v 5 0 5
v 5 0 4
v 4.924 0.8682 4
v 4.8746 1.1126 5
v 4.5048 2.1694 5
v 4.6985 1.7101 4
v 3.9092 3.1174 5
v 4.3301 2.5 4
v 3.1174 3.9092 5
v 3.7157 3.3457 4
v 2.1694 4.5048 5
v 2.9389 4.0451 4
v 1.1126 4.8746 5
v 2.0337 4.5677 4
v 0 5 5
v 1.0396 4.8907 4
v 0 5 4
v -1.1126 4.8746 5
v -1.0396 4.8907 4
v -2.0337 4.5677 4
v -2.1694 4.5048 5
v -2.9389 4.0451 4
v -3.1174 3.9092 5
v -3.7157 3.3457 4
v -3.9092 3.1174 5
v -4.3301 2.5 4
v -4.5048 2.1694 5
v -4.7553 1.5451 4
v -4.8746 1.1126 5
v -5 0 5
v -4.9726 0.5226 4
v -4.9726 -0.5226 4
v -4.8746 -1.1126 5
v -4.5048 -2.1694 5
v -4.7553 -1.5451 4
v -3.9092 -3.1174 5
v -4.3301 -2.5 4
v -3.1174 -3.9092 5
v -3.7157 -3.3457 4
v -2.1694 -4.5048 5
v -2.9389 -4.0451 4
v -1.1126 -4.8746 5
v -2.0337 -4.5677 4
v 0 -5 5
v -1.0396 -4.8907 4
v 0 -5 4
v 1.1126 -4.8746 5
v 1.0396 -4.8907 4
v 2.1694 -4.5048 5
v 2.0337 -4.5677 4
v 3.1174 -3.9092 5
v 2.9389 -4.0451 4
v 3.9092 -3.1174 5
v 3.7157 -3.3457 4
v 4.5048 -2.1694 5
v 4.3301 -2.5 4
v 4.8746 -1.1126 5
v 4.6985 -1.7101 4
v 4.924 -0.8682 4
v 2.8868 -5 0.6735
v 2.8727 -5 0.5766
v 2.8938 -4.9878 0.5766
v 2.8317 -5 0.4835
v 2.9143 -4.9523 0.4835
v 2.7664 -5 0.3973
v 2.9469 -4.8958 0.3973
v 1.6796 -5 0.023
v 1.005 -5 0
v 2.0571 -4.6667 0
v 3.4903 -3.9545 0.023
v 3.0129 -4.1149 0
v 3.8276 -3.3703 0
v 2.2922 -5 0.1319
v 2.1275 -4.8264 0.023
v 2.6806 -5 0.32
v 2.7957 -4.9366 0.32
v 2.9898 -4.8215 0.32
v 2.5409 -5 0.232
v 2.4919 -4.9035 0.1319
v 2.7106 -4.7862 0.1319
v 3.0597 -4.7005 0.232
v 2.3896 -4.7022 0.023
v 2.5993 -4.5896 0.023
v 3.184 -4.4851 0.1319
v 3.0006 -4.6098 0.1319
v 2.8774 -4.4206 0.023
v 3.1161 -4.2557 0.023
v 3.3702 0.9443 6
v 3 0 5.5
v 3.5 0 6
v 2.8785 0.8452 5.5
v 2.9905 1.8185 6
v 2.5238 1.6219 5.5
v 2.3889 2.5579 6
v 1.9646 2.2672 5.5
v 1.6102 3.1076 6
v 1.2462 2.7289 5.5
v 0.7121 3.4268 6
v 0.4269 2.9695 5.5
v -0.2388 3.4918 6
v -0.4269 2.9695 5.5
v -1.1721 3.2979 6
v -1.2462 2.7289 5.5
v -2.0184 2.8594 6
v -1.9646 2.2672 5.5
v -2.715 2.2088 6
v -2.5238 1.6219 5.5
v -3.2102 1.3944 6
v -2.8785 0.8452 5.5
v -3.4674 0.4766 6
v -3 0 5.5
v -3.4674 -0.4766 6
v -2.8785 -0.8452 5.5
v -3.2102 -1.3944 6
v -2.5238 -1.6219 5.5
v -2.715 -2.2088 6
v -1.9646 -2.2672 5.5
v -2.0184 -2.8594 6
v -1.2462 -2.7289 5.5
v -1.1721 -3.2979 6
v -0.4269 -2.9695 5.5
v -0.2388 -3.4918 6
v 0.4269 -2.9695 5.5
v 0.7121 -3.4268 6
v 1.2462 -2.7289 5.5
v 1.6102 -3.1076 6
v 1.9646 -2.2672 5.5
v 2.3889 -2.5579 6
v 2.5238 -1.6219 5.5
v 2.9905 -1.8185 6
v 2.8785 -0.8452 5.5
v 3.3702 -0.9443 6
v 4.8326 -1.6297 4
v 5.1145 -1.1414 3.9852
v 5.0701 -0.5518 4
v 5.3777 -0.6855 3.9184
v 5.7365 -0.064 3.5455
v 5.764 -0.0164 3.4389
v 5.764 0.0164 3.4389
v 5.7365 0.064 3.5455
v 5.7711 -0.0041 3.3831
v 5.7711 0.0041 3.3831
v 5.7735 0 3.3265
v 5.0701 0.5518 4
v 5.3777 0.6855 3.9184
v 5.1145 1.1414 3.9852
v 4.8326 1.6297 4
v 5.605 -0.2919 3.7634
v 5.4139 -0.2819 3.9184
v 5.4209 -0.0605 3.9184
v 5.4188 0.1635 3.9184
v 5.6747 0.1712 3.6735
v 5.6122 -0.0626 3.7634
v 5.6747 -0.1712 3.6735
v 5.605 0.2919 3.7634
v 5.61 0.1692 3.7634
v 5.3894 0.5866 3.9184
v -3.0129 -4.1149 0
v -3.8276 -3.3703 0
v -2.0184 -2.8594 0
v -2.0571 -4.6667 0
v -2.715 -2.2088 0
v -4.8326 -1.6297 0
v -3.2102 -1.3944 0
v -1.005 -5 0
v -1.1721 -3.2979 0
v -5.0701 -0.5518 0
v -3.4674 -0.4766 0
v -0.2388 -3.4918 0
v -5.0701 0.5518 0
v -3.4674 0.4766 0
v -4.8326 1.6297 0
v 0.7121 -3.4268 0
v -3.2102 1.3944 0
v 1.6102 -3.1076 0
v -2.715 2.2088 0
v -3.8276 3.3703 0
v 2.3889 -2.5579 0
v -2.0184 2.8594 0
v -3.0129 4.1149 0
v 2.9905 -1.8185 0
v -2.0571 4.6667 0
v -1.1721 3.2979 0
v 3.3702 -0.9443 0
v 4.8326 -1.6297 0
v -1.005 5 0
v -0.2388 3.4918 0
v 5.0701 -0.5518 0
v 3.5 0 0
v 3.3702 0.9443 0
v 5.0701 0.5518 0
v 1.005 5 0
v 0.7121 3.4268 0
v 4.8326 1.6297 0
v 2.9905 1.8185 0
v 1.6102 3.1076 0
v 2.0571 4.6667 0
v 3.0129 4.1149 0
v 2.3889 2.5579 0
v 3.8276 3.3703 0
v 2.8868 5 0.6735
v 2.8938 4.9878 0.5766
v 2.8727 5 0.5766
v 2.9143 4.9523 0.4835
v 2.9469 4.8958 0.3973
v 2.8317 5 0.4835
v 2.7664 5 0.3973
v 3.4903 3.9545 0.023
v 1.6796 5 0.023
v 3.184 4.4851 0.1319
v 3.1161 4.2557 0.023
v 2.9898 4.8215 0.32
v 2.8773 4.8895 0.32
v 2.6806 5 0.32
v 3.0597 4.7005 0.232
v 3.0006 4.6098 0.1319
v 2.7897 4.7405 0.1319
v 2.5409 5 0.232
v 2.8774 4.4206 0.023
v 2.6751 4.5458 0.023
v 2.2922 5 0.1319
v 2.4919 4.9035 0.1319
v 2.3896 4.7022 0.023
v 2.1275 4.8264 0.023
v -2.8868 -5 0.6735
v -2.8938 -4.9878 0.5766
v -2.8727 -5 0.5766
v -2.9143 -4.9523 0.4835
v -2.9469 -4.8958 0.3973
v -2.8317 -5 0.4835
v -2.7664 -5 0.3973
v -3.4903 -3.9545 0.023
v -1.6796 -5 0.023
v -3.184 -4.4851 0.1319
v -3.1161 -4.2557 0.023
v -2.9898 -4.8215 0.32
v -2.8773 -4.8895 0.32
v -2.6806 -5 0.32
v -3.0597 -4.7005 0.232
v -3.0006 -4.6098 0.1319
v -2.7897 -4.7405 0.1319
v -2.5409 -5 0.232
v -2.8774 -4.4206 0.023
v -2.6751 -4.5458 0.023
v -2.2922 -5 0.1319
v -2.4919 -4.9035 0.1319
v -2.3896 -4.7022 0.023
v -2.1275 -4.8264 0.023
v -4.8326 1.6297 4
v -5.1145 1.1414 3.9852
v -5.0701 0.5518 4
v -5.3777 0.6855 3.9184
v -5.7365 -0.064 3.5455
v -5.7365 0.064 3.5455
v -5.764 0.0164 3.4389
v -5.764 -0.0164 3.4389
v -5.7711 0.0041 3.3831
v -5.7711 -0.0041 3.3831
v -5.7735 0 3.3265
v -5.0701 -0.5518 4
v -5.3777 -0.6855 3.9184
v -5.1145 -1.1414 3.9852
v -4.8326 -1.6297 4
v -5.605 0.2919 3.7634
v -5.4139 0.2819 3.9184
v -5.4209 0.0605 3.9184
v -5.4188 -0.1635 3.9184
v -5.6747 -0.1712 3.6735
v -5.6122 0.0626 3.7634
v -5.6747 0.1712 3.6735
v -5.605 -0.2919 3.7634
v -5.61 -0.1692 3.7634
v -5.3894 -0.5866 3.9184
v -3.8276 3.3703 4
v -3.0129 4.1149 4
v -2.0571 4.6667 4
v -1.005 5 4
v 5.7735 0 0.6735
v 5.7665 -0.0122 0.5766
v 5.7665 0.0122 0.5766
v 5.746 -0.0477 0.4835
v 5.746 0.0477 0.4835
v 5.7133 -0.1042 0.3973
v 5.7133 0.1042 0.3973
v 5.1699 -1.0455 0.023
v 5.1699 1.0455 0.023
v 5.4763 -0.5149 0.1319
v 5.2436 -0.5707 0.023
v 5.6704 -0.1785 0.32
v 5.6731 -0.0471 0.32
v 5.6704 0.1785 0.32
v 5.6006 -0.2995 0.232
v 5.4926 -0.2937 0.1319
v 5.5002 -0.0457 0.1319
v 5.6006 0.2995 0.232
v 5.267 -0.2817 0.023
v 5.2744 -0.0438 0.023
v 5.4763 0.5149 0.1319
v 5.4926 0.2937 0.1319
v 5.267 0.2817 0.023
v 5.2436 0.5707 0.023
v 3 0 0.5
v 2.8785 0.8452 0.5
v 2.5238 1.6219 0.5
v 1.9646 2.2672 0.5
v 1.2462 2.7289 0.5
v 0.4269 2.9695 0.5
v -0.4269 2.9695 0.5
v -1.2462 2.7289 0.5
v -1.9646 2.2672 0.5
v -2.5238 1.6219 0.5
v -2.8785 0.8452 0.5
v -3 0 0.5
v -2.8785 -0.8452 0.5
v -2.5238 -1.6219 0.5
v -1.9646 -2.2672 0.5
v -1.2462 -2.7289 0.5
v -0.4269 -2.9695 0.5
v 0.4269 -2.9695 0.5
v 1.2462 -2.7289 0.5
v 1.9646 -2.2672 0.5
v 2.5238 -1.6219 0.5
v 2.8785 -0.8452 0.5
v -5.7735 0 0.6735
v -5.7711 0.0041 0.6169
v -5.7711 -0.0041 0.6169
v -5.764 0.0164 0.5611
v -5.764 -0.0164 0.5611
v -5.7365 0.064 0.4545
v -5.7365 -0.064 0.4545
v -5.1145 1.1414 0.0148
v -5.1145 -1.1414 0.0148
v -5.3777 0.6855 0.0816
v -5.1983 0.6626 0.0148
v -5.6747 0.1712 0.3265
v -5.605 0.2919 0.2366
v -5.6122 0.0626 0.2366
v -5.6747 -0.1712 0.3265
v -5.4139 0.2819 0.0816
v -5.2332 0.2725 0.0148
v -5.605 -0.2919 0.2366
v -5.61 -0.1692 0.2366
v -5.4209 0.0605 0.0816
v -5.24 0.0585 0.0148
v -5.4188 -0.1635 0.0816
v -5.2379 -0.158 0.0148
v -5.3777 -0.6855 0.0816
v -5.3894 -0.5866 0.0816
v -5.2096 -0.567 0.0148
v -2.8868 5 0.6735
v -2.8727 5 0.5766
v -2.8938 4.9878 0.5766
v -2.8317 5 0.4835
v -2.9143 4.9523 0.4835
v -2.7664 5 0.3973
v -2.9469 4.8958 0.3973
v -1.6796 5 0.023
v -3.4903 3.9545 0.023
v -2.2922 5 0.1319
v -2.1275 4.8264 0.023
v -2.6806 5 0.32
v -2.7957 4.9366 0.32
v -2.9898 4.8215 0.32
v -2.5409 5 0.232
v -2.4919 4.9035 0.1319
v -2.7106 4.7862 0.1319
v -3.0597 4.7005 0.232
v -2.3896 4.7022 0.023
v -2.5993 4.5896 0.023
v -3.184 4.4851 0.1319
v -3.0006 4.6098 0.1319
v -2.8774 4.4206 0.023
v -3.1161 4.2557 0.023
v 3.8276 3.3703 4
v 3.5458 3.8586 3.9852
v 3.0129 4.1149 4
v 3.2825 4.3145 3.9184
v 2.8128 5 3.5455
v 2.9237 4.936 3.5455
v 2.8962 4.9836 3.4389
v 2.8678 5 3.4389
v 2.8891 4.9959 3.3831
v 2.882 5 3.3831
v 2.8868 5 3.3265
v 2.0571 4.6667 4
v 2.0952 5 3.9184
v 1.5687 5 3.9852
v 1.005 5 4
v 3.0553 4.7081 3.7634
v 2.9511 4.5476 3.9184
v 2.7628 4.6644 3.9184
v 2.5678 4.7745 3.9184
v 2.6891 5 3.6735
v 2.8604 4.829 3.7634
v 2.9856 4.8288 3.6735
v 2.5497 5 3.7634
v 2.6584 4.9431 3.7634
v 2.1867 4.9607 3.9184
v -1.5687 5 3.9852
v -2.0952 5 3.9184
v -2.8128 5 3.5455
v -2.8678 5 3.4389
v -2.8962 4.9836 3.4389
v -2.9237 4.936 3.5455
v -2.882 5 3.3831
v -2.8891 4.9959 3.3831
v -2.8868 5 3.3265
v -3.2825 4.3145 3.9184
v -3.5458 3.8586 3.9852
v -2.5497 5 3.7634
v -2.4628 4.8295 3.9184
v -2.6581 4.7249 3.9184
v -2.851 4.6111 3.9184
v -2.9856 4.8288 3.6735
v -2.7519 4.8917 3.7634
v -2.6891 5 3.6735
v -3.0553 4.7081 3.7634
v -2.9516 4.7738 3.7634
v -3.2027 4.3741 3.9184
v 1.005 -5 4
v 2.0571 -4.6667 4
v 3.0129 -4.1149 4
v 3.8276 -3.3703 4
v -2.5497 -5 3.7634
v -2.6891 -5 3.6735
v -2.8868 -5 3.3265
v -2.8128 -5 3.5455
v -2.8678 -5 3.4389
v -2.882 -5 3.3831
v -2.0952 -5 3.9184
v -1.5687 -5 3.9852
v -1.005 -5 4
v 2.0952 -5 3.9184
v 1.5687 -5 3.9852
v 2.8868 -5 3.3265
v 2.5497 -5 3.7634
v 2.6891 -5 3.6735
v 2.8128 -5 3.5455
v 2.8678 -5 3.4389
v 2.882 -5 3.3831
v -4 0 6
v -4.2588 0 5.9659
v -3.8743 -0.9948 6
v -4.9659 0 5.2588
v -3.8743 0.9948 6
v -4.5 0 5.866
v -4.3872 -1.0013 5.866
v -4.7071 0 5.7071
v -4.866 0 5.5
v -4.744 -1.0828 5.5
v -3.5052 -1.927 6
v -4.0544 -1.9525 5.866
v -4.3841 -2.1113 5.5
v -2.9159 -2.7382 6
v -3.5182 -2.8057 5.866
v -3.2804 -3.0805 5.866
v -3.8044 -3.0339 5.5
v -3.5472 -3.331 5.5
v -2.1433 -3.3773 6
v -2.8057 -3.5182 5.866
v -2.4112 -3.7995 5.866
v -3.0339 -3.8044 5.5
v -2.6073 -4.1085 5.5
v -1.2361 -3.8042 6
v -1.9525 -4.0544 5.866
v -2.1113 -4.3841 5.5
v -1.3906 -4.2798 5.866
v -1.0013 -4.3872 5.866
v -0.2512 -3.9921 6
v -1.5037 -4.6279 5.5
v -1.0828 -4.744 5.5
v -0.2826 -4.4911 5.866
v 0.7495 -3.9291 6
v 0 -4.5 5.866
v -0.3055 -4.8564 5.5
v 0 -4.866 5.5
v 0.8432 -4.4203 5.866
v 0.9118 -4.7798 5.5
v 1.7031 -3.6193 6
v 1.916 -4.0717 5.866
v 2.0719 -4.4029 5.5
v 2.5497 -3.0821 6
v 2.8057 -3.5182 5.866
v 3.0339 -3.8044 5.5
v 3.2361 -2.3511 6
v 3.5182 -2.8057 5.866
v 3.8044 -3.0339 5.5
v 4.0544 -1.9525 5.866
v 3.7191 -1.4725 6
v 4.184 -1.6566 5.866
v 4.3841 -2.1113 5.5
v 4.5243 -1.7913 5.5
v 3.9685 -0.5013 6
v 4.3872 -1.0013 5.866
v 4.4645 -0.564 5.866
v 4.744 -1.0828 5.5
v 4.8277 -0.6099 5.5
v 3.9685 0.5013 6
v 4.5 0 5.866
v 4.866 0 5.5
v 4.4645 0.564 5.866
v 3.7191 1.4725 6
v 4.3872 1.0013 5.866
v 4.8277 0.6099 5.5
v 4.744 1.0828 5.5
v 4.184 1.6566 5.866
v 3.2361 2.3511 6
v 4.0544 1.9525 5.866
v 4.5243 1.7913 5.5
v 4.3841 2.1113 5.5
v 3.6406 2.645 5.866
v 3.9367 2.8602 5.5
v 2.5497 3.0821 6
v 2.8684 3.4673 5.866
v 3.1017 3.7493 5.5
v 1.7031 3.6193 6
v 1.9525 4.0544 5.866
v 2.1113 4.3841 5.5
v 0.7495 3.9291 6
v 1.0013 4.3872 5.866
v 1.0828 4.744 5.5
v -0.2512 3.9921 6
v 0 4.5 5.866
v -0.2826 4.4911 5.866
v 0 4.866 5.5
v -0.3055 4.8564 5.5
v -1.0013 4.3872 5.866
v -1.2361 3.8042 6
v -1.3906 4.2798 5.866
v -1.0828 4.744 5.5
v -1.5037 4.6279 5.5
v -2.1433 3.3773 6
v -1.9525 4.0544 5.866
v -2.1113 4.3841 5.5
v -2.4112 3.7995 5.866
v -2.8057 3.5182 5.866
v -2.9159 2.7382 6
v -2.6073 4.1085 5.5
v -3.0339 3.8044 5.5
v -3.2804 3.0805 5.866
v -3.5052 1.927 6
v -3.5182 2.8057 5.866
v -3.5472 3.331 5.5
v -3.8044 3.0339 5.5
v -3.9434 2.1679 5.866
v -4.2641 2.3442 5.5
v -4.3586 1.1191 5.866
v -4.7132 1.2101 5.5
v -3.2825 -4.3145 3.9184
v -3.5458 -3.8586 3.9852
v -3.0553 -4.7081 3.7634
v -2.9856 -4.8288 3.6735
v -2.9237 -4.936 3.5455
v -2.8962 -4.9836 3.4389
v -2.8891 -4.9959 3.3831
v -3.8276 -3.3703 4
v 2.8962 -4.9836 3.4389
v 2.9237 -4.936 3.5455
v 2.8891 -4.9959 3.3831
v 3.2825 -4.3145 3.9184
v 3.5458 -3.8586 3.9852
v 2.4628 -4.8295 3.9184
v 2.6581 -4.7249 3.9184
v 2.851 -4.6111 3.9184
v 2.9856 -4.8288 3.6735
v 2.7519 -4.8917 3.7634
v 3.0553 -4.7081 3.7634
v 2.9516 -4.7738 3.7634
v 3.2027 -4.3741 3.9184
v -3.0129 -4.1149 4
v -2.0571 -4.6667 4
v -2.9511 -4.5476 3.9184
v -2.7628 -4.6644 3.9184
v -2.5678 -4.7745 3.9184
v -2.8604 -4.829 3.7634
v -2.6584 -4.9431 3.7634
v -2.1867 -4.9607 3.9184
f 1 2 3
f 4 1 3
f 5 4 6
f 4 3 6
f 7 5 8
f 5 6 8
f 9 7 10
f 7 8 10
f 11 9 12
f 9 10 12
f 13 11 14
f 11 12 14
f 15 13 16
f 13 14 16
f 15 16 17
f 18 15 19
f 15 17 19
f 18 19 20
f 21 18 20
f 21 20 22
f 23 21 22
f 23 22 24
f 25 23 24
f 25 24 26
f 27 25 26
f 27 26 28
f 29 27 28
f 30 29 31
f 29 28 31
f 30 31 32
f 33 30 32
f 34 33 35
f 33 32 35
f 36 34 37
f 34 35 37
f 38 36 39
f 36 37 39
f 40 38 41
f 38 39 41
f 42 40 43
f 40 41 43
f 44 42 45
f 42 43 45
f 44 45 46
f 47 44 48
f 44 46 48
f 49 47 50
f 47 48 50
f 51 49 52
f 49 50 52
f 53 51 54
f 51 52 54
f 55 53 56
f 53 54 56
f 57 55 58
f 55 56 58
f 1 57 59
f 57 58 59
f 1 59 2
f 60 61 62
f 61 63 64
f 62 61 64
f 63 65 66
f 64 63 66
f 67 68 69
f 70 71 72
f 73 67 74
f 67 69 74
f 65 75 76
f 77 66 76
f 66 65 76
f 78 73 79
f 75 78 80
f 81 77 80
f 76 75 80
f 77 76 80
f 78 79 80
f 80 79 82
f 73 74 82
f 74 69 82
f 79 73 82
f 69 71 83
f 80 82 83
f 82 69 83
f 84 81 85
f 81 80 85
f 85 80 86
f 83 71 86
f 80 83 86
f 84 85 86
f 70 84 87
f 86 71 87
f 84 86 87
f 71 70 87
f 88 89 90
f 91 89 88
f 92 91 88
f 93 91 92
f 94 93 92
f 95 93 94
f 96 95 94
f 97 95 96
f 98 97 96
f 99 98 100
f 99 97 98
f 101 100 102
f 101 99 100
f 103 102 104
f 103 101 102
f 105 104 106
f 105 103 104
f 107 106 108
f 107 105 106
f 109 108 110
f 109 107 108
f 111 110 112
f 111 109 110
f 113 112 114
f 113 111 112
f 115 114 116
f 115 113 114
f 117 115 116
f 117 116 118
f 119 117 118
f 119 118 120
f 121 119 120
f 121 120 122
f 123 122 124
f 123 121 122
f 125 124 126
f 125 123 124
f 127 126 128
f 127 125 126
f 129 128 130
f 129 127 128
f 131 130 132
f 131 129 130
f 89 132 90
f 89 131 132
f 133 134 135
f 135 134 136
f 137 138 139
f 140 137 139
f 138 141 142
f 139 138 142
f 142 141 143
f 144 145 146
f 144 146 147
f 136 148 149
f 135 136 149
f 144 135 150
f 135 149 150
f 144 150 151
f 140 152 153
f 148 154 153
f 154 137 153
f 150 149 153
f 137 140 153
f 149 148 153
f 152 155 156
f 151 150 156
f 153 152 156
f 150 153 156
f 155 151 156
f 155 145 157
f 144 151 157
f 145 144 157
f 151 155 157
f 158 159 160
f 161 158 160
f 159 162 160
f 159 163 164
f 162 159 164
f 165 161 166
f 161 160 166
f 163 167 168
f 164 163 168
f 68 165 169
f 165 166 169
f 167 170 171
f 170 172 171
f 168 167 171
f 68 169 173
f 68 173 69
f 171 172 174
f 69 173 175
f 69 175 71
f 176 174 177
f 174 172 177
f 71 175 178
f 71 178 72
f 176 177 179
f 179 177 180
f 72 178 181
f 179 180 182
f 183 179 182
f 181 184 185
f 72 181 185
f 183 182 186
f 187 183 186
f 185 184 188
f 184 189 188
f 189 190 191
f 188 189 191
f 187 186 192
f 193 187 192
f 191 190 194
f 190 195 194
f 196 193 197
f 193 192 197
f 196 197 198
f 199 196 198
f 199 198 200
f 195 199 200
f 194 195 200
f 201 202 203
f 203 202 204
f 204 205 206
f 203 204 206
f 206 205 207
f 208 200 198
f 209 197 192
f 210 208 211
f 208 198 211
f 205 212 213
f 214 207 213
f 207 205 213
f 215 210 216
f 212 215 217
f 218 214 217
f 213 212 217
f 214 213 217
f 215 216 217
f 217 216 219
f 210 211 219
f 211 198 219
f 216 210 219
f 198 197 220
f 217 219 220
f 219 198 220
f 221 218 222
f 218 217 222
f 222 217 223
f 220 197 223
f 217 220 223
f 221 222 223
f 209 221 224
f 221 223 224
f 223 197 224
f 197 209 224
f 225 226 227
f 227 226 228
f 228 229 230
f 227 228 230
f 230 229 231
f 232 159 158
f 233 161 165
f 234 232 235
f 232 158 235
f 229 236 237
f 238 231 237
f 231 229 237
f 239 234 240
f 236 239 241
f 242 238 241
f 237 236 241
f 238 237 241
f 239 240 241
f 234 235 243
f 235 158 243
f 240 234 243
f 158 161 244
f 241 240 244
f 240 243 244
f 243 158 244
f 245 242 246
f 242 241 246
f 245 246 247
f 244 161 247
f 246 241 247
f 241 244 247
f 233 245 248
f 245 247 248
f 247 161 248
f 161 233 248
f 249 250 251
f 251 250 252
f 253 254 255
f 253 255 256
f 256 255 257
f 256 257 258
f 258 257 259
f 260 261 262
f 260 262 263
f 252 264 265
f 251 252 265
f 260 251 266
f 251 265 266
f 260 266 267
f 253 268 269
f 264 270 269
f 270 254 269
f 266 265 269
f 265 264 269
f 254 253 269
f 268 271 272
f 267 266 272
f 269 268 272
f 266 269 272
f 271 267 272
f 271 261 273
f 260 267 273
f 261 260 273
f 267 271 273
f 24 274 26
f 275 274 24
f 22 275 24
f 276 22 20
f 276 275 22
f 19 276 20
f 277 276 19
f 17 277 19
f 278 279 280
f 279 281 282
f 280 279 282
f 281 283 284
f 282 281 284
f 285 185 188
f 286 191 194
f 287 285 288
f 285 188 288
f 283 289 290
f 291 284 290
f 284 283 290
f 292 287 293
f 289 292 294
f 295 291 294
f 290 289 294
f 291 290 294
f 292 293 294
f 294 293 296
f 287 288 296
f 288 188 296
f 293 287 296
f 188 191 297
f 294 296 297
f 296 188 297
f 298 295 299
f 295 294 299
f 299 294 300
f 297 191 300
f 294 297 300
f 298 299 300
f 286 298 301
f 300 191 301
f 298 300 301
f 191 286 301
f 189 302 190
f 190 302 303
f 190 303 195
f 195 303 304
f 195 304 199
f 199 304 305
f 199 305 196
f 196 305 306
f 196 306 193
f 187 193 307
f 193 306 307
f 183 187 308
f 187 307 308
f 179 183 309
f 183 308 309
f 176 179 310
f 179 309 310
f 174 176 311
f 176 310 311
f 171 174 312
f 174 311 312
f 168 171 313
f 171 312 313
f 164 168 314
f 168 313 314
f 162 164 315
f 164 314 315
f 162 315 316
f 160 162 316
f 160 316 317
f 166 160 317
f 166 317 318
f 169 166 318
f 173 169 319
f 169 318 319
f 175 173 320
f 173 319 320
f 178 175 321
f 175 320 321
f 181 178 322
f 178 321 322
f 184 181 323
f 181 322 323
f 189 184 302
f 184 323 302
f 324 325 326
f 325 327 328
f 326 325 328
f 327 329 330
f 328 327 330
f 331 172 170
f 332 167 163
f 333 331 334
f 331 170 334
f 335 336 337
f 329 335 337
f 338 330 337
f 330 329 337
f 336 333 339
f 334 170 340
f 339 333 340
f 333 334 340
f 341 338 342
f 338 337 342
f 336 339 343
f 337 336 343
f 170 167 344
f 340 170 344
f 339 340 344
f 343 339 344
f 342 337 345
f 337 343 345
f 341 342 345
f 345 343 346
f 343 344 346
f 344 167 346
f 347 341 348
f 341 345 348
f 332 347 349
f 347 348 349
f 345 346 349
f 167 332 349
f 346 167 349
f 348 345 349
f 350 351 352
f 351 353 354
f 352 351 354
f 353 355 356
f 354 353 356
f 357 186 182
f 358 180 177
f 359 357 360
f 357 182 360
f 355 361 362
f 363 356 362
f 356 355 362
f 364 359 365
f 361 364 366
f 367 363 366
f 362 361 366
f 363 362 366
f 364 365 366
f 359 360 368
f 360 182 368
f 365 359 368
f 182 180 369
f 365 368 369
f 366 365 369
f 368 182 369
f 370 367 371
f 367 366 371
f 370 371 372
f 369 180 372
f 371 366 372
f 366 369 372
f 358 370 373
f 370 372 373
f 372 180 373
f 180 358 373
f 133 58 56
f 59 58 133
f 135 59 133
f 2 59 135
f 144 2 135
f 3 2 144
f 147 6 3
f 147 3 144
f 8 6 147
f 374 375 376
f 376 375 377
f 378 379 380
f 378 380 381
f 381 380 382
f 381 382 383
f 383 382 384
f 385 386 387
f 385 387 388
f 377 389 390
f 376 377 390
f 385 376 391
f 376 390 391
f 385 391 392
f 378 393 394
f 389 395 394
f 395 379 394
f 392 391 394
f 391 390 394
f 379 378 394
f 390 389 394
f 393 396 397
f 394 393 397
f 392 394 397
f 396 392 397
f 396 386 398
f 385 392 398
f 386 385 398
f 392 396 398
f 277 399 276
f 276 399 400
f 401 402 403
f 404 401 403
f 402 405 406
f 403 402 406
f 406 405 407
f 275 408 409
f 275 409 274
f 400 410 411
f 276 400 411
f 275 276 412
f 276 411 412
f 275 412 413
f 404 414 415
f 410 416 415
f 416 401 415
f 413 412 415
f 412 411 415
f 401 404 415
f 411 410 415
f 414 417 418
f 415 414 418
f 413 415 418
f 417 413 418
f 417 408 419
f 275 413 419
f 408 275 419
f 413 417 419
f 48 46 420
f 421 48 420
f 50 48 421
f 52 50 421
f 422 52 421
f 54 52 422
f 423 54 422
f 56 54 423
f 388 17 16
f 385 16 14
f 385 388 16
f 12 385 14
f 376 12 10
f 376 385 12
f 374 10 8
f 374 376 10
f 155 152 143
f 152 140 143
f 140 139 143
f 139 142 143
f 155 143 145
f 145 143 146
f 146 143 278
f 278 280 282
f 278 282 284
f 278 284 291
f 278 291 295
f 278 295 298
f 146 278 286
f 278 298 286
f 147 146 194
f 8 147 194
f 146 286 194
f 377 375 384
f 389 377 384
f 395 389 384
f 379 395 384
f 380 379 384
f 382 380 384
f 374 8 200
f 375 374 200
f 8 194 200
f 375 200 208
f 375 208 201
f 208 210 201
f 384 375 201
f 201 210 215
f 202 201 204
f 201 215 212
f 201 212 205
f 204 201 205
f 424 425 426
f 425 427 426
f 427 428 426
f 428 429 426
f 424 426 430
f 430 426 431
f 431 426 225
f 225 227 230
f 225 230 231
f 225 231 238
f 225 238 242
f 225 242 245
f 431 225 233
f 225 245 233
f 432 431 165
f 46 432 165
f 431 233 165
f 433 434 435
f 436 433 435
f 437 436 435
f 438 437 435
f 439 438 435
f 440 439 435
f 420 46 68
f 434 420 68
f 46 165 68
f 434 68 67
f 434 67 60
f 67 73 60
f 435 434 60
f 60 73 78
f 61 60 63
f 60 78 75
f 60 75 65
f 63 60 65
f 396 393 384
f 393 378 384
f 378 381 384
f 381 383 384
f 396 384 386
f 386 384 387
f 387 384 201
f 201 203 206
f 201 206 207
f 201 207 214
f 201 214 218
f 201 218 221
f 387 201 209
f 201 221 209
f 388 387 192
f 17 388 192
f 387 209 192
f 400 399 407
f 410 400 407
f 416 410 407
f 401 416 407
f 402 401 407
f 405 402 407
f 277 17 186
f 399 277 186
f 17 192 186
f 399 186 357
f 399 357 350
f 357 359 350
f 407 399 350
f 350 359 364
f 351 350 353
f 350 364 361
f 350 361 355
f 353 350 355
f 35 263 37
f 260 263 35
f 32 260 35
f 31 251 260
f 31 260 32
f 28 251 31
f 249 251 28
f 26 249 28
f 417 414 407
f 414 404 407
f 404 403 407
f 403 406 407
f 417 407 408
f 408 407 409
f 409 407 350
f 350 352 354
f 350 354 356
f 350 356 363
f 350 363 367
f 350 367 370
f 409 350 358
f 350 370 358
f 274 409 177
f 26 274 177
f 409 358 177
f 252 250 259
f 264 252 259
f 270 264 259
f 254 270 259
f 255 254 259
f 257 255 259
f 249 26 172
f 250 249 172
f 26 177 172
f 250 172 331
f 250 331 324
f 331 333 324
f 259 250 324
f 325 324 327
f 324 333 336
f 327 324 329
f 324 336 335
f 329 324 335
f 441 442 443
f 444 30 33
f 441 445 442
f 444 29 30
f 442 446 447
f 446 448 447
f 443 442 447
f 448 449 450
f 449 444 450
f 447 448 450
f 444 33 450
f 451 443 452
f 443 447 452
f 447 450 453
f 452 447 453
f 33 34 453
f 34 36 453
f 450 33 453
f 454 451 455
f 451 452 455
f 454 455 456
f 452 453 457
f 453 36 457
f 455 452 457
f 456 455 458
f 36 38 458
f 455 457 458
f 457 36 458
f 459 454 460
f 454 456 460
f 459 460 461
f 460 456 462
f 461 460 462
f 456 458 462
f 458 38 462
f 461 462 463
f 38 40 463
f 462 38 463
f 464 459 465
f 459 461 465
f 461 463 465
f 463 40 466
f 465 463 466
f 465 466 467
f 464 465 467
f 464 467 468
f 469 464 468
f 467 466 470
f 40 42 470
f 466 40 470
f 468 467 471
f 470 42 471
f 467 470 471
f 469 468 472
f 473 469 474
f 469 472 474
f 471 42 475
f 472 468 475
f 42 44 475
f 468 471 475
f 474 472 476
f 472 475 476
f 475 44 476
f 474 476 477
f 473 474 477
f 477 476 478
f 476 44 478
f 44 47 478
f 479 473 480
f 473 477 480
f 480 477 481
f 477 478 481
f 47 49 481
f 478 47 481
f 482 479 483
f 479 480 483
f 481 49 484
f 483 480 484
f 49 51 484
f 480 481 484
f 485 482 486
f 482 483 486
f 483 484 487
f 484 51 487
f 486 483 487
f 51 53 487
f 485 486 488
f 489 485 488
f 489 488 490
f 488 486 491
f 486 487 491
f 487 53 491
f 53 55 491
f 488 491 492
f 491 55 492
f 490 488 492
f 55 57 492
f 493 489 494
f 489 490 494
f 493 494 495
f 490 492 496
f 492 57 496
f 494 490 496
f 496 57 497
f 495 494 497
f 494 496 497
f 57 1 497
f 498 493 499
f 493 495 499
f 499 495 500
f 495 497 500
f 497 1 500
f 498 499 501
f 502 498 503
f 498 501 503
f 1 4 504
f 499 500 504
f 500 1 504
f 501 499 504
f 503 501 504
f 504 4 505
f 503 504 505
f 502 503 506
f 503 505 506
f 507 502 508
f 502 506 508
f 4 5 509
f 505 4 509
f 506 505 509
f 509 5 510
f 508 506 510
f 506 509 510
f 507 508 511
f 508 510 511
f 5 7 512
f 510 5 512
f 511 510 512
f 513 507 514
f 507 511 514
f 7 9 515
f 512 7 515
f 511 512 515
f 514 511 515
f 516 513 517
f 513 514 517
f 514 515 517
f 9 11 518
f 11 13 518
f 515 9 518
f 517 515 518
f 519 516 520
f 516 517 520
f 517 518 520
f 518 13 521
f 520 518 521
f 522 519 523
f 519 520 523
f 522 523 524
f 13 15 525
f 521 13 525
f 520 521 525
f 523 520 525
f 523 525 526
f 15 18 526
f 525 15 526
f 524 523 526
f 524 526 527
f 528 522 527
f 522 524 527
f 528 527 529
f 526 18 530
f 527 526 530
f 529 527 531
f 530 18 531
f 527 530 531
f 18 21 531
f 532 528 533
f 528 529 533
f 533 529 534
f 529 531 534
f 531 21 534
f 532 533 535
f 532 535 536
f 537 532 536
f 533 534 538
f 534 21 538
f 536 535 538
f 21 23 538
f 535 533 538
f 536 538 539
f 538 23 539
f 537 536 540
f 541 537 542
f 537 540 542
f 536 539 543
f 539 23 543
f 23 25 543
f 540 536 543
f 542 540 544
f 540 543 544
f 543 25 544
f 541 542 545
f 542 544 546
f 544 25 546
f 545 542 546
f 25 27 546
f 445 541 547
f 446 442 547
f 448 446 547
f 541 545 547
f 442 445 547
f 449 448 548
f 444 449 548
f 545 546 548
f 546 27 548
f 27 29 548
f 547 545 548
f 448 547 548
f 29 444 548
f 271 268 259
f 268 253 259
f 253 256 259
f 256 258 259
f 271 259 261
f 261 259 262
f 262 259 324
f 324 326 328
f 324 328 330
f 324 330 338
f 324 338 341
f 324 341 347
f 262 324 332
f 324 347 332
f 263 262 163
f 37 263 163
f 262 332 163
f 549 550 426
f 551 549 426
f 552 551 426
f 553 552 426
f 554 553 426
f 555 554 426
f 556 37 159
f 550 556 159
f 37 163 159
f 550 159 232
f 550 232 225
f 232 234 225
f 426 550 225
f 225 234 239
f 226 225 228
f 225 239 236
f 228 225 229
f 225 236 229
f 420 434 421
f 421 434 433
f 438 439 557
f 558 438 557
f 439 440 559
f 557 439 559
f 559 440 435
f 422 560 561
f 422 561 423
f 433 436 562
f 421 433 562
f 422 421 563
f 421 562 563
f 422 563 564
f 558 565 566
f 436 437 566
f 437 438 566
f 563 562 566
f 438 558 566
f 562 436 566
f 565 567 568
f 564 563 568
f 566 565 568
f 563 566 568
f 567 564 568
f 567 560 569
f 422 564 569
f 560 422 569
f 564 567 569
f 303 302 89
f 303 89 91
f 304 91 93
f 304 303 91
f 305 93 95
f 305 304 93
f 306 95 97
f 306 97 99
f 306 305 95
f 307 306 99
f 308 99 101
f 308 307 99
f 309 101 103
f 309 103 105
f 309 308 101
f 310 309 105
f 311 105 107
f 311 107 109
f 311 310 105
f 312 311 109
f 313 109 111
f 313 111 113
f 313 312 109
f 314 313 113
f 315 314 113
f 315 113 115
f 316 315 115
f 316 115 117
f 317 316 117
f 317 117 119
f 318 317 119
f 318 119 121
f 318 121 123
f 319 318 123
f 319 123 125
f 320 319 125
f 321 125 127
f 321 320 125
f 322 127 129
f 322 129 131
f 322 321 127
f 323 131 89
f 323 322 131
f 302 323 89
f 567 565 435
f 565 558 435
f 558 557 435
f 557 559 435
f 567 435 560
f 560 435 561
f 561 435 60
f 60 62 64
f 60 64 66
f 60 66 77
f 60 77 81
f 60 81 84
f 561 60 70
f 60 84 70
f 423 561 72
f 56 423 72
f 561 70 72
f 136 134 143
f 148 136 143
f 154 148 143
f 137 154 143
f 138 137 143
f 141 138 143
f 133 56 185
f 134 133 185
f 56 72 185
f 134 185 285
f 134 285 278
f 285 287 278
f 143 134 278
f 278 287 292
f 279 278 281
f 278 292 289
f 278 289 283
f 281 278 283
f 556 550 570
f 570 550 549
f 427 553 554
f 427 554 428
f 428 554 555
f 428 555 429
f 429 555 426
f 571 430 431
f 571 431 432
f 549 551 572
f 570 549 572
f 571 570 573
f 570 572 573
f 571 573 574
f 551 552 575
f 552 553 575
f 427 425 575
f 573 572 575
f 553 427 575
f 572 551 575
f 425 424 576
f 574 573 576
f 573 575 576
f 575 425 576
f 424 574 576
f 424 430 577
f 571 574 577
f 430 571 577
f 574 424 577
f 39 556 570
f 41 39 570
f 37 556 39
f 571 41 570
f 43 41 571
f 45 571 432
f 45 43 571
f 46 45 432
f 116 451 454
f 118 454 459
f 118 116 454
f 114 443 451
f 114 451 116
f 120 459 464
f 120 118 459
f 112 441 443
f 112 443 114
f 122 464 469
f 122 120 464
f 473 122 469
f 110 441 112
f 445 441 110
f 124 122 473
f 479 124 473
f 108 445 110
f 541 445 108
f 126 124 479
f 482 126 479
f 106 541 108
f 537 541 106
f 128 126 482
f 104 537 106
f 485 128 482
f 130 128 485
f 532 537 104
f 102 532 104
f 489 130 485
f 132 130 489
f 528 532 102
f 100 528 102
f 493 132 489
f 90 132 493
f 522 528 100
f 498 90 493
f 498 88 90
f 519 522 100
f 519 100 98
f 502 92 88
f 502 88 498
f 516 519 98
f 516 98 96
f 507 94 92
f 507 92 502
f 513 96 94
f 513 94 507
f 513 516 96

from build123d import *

# Parameters (mm, degrees)
SZKIC1_R                    = 3
DODANIE_WYCI_GNI_CIE1_DEPTH = 4
SZKIC2_R                    = 5
SZKIC2_R_2                  = 3
DODANIE_WYCI_GNI_CIE2_DEPTH = 6
SFAZOWANIE1_SIZE            = 0.5


with BuildPart() as part:
    # Szkic1 → Dodanie-wyciągnięcie1 (new body)
    with BuildSketch(Plane.XY):
        Polygon((-5.773502692, 0), (-2.886751346, -5), (2.886751346, -5), (5.773502692, 0), (2.886751346, 5), (-2.886751346, 5), align=None)
        Circle(SZKIC1_R, mode=Mode.SUBTRACT)
    extrude(amount=DODANIE_WYCI_GNI_CIE1_DEPTH)

    # Szkic2 → Dodanie-wyciągnięcie2 (add)
    with BuildSketch(Plane.XY):
        Circle(SZKIC2_R)
        Circle(SZKIC2_R_2, mode=Mode.SUBTRACT)
    extrude(amount=DODANIE_WYCI_GNI_CIE2_DEPTH)

    # Sfazowanie1
    sfazowanie1_edges = [part.edges().sort_by_distance(p)[0] for p in [
        (-3, 0, 0),
        (-3, 0, 6),
    ]]
    chamfer(sfazowanie1_edges, length=SFAZOWANIE1_SIZE)

    # Szkic3 → Wycięcie-obrót1 (revolve, cut)
    with BuildSketch(Plane(origin=(0, 0, 0), x_dir=(1, 0, 0), z_dir=(0, 1, 0))):
        with BuildLine():
            Line((-5.773502692, 0), (-5.773502692, -0.673502692))
            ThreePointArc((-5.773502692, -0.673502692), (-5.576238321, -0.197264371), (-5.1, 0))
            Line((-5.1, 0), (-5.773502692, 0))
        make_face()
        with BuildLine():
            ThreePointArc((-5.1, -4), (-5.576238321, -3.802735629), (-5.773502692, -3.326497308))
            Line((-5.773502692, -3.326497308), (-5.773502692, -4))
            Line((-5.773502692, -4), (-5.1, -4))
        make_face()
        with BuildLine():
            Line((-5, -6), (-4, -6))
            ThreePointArc((-4, -6), (-4.707106781, -5.707106781), (-5, -5))
            Line((-5, -5), (-5, -6))
        make_face()
    revolve(axis=Axis((0, 0, -1.701574894), (0, 0, 1)), mode=Mode.SUBTRACT)


solid = part.part
